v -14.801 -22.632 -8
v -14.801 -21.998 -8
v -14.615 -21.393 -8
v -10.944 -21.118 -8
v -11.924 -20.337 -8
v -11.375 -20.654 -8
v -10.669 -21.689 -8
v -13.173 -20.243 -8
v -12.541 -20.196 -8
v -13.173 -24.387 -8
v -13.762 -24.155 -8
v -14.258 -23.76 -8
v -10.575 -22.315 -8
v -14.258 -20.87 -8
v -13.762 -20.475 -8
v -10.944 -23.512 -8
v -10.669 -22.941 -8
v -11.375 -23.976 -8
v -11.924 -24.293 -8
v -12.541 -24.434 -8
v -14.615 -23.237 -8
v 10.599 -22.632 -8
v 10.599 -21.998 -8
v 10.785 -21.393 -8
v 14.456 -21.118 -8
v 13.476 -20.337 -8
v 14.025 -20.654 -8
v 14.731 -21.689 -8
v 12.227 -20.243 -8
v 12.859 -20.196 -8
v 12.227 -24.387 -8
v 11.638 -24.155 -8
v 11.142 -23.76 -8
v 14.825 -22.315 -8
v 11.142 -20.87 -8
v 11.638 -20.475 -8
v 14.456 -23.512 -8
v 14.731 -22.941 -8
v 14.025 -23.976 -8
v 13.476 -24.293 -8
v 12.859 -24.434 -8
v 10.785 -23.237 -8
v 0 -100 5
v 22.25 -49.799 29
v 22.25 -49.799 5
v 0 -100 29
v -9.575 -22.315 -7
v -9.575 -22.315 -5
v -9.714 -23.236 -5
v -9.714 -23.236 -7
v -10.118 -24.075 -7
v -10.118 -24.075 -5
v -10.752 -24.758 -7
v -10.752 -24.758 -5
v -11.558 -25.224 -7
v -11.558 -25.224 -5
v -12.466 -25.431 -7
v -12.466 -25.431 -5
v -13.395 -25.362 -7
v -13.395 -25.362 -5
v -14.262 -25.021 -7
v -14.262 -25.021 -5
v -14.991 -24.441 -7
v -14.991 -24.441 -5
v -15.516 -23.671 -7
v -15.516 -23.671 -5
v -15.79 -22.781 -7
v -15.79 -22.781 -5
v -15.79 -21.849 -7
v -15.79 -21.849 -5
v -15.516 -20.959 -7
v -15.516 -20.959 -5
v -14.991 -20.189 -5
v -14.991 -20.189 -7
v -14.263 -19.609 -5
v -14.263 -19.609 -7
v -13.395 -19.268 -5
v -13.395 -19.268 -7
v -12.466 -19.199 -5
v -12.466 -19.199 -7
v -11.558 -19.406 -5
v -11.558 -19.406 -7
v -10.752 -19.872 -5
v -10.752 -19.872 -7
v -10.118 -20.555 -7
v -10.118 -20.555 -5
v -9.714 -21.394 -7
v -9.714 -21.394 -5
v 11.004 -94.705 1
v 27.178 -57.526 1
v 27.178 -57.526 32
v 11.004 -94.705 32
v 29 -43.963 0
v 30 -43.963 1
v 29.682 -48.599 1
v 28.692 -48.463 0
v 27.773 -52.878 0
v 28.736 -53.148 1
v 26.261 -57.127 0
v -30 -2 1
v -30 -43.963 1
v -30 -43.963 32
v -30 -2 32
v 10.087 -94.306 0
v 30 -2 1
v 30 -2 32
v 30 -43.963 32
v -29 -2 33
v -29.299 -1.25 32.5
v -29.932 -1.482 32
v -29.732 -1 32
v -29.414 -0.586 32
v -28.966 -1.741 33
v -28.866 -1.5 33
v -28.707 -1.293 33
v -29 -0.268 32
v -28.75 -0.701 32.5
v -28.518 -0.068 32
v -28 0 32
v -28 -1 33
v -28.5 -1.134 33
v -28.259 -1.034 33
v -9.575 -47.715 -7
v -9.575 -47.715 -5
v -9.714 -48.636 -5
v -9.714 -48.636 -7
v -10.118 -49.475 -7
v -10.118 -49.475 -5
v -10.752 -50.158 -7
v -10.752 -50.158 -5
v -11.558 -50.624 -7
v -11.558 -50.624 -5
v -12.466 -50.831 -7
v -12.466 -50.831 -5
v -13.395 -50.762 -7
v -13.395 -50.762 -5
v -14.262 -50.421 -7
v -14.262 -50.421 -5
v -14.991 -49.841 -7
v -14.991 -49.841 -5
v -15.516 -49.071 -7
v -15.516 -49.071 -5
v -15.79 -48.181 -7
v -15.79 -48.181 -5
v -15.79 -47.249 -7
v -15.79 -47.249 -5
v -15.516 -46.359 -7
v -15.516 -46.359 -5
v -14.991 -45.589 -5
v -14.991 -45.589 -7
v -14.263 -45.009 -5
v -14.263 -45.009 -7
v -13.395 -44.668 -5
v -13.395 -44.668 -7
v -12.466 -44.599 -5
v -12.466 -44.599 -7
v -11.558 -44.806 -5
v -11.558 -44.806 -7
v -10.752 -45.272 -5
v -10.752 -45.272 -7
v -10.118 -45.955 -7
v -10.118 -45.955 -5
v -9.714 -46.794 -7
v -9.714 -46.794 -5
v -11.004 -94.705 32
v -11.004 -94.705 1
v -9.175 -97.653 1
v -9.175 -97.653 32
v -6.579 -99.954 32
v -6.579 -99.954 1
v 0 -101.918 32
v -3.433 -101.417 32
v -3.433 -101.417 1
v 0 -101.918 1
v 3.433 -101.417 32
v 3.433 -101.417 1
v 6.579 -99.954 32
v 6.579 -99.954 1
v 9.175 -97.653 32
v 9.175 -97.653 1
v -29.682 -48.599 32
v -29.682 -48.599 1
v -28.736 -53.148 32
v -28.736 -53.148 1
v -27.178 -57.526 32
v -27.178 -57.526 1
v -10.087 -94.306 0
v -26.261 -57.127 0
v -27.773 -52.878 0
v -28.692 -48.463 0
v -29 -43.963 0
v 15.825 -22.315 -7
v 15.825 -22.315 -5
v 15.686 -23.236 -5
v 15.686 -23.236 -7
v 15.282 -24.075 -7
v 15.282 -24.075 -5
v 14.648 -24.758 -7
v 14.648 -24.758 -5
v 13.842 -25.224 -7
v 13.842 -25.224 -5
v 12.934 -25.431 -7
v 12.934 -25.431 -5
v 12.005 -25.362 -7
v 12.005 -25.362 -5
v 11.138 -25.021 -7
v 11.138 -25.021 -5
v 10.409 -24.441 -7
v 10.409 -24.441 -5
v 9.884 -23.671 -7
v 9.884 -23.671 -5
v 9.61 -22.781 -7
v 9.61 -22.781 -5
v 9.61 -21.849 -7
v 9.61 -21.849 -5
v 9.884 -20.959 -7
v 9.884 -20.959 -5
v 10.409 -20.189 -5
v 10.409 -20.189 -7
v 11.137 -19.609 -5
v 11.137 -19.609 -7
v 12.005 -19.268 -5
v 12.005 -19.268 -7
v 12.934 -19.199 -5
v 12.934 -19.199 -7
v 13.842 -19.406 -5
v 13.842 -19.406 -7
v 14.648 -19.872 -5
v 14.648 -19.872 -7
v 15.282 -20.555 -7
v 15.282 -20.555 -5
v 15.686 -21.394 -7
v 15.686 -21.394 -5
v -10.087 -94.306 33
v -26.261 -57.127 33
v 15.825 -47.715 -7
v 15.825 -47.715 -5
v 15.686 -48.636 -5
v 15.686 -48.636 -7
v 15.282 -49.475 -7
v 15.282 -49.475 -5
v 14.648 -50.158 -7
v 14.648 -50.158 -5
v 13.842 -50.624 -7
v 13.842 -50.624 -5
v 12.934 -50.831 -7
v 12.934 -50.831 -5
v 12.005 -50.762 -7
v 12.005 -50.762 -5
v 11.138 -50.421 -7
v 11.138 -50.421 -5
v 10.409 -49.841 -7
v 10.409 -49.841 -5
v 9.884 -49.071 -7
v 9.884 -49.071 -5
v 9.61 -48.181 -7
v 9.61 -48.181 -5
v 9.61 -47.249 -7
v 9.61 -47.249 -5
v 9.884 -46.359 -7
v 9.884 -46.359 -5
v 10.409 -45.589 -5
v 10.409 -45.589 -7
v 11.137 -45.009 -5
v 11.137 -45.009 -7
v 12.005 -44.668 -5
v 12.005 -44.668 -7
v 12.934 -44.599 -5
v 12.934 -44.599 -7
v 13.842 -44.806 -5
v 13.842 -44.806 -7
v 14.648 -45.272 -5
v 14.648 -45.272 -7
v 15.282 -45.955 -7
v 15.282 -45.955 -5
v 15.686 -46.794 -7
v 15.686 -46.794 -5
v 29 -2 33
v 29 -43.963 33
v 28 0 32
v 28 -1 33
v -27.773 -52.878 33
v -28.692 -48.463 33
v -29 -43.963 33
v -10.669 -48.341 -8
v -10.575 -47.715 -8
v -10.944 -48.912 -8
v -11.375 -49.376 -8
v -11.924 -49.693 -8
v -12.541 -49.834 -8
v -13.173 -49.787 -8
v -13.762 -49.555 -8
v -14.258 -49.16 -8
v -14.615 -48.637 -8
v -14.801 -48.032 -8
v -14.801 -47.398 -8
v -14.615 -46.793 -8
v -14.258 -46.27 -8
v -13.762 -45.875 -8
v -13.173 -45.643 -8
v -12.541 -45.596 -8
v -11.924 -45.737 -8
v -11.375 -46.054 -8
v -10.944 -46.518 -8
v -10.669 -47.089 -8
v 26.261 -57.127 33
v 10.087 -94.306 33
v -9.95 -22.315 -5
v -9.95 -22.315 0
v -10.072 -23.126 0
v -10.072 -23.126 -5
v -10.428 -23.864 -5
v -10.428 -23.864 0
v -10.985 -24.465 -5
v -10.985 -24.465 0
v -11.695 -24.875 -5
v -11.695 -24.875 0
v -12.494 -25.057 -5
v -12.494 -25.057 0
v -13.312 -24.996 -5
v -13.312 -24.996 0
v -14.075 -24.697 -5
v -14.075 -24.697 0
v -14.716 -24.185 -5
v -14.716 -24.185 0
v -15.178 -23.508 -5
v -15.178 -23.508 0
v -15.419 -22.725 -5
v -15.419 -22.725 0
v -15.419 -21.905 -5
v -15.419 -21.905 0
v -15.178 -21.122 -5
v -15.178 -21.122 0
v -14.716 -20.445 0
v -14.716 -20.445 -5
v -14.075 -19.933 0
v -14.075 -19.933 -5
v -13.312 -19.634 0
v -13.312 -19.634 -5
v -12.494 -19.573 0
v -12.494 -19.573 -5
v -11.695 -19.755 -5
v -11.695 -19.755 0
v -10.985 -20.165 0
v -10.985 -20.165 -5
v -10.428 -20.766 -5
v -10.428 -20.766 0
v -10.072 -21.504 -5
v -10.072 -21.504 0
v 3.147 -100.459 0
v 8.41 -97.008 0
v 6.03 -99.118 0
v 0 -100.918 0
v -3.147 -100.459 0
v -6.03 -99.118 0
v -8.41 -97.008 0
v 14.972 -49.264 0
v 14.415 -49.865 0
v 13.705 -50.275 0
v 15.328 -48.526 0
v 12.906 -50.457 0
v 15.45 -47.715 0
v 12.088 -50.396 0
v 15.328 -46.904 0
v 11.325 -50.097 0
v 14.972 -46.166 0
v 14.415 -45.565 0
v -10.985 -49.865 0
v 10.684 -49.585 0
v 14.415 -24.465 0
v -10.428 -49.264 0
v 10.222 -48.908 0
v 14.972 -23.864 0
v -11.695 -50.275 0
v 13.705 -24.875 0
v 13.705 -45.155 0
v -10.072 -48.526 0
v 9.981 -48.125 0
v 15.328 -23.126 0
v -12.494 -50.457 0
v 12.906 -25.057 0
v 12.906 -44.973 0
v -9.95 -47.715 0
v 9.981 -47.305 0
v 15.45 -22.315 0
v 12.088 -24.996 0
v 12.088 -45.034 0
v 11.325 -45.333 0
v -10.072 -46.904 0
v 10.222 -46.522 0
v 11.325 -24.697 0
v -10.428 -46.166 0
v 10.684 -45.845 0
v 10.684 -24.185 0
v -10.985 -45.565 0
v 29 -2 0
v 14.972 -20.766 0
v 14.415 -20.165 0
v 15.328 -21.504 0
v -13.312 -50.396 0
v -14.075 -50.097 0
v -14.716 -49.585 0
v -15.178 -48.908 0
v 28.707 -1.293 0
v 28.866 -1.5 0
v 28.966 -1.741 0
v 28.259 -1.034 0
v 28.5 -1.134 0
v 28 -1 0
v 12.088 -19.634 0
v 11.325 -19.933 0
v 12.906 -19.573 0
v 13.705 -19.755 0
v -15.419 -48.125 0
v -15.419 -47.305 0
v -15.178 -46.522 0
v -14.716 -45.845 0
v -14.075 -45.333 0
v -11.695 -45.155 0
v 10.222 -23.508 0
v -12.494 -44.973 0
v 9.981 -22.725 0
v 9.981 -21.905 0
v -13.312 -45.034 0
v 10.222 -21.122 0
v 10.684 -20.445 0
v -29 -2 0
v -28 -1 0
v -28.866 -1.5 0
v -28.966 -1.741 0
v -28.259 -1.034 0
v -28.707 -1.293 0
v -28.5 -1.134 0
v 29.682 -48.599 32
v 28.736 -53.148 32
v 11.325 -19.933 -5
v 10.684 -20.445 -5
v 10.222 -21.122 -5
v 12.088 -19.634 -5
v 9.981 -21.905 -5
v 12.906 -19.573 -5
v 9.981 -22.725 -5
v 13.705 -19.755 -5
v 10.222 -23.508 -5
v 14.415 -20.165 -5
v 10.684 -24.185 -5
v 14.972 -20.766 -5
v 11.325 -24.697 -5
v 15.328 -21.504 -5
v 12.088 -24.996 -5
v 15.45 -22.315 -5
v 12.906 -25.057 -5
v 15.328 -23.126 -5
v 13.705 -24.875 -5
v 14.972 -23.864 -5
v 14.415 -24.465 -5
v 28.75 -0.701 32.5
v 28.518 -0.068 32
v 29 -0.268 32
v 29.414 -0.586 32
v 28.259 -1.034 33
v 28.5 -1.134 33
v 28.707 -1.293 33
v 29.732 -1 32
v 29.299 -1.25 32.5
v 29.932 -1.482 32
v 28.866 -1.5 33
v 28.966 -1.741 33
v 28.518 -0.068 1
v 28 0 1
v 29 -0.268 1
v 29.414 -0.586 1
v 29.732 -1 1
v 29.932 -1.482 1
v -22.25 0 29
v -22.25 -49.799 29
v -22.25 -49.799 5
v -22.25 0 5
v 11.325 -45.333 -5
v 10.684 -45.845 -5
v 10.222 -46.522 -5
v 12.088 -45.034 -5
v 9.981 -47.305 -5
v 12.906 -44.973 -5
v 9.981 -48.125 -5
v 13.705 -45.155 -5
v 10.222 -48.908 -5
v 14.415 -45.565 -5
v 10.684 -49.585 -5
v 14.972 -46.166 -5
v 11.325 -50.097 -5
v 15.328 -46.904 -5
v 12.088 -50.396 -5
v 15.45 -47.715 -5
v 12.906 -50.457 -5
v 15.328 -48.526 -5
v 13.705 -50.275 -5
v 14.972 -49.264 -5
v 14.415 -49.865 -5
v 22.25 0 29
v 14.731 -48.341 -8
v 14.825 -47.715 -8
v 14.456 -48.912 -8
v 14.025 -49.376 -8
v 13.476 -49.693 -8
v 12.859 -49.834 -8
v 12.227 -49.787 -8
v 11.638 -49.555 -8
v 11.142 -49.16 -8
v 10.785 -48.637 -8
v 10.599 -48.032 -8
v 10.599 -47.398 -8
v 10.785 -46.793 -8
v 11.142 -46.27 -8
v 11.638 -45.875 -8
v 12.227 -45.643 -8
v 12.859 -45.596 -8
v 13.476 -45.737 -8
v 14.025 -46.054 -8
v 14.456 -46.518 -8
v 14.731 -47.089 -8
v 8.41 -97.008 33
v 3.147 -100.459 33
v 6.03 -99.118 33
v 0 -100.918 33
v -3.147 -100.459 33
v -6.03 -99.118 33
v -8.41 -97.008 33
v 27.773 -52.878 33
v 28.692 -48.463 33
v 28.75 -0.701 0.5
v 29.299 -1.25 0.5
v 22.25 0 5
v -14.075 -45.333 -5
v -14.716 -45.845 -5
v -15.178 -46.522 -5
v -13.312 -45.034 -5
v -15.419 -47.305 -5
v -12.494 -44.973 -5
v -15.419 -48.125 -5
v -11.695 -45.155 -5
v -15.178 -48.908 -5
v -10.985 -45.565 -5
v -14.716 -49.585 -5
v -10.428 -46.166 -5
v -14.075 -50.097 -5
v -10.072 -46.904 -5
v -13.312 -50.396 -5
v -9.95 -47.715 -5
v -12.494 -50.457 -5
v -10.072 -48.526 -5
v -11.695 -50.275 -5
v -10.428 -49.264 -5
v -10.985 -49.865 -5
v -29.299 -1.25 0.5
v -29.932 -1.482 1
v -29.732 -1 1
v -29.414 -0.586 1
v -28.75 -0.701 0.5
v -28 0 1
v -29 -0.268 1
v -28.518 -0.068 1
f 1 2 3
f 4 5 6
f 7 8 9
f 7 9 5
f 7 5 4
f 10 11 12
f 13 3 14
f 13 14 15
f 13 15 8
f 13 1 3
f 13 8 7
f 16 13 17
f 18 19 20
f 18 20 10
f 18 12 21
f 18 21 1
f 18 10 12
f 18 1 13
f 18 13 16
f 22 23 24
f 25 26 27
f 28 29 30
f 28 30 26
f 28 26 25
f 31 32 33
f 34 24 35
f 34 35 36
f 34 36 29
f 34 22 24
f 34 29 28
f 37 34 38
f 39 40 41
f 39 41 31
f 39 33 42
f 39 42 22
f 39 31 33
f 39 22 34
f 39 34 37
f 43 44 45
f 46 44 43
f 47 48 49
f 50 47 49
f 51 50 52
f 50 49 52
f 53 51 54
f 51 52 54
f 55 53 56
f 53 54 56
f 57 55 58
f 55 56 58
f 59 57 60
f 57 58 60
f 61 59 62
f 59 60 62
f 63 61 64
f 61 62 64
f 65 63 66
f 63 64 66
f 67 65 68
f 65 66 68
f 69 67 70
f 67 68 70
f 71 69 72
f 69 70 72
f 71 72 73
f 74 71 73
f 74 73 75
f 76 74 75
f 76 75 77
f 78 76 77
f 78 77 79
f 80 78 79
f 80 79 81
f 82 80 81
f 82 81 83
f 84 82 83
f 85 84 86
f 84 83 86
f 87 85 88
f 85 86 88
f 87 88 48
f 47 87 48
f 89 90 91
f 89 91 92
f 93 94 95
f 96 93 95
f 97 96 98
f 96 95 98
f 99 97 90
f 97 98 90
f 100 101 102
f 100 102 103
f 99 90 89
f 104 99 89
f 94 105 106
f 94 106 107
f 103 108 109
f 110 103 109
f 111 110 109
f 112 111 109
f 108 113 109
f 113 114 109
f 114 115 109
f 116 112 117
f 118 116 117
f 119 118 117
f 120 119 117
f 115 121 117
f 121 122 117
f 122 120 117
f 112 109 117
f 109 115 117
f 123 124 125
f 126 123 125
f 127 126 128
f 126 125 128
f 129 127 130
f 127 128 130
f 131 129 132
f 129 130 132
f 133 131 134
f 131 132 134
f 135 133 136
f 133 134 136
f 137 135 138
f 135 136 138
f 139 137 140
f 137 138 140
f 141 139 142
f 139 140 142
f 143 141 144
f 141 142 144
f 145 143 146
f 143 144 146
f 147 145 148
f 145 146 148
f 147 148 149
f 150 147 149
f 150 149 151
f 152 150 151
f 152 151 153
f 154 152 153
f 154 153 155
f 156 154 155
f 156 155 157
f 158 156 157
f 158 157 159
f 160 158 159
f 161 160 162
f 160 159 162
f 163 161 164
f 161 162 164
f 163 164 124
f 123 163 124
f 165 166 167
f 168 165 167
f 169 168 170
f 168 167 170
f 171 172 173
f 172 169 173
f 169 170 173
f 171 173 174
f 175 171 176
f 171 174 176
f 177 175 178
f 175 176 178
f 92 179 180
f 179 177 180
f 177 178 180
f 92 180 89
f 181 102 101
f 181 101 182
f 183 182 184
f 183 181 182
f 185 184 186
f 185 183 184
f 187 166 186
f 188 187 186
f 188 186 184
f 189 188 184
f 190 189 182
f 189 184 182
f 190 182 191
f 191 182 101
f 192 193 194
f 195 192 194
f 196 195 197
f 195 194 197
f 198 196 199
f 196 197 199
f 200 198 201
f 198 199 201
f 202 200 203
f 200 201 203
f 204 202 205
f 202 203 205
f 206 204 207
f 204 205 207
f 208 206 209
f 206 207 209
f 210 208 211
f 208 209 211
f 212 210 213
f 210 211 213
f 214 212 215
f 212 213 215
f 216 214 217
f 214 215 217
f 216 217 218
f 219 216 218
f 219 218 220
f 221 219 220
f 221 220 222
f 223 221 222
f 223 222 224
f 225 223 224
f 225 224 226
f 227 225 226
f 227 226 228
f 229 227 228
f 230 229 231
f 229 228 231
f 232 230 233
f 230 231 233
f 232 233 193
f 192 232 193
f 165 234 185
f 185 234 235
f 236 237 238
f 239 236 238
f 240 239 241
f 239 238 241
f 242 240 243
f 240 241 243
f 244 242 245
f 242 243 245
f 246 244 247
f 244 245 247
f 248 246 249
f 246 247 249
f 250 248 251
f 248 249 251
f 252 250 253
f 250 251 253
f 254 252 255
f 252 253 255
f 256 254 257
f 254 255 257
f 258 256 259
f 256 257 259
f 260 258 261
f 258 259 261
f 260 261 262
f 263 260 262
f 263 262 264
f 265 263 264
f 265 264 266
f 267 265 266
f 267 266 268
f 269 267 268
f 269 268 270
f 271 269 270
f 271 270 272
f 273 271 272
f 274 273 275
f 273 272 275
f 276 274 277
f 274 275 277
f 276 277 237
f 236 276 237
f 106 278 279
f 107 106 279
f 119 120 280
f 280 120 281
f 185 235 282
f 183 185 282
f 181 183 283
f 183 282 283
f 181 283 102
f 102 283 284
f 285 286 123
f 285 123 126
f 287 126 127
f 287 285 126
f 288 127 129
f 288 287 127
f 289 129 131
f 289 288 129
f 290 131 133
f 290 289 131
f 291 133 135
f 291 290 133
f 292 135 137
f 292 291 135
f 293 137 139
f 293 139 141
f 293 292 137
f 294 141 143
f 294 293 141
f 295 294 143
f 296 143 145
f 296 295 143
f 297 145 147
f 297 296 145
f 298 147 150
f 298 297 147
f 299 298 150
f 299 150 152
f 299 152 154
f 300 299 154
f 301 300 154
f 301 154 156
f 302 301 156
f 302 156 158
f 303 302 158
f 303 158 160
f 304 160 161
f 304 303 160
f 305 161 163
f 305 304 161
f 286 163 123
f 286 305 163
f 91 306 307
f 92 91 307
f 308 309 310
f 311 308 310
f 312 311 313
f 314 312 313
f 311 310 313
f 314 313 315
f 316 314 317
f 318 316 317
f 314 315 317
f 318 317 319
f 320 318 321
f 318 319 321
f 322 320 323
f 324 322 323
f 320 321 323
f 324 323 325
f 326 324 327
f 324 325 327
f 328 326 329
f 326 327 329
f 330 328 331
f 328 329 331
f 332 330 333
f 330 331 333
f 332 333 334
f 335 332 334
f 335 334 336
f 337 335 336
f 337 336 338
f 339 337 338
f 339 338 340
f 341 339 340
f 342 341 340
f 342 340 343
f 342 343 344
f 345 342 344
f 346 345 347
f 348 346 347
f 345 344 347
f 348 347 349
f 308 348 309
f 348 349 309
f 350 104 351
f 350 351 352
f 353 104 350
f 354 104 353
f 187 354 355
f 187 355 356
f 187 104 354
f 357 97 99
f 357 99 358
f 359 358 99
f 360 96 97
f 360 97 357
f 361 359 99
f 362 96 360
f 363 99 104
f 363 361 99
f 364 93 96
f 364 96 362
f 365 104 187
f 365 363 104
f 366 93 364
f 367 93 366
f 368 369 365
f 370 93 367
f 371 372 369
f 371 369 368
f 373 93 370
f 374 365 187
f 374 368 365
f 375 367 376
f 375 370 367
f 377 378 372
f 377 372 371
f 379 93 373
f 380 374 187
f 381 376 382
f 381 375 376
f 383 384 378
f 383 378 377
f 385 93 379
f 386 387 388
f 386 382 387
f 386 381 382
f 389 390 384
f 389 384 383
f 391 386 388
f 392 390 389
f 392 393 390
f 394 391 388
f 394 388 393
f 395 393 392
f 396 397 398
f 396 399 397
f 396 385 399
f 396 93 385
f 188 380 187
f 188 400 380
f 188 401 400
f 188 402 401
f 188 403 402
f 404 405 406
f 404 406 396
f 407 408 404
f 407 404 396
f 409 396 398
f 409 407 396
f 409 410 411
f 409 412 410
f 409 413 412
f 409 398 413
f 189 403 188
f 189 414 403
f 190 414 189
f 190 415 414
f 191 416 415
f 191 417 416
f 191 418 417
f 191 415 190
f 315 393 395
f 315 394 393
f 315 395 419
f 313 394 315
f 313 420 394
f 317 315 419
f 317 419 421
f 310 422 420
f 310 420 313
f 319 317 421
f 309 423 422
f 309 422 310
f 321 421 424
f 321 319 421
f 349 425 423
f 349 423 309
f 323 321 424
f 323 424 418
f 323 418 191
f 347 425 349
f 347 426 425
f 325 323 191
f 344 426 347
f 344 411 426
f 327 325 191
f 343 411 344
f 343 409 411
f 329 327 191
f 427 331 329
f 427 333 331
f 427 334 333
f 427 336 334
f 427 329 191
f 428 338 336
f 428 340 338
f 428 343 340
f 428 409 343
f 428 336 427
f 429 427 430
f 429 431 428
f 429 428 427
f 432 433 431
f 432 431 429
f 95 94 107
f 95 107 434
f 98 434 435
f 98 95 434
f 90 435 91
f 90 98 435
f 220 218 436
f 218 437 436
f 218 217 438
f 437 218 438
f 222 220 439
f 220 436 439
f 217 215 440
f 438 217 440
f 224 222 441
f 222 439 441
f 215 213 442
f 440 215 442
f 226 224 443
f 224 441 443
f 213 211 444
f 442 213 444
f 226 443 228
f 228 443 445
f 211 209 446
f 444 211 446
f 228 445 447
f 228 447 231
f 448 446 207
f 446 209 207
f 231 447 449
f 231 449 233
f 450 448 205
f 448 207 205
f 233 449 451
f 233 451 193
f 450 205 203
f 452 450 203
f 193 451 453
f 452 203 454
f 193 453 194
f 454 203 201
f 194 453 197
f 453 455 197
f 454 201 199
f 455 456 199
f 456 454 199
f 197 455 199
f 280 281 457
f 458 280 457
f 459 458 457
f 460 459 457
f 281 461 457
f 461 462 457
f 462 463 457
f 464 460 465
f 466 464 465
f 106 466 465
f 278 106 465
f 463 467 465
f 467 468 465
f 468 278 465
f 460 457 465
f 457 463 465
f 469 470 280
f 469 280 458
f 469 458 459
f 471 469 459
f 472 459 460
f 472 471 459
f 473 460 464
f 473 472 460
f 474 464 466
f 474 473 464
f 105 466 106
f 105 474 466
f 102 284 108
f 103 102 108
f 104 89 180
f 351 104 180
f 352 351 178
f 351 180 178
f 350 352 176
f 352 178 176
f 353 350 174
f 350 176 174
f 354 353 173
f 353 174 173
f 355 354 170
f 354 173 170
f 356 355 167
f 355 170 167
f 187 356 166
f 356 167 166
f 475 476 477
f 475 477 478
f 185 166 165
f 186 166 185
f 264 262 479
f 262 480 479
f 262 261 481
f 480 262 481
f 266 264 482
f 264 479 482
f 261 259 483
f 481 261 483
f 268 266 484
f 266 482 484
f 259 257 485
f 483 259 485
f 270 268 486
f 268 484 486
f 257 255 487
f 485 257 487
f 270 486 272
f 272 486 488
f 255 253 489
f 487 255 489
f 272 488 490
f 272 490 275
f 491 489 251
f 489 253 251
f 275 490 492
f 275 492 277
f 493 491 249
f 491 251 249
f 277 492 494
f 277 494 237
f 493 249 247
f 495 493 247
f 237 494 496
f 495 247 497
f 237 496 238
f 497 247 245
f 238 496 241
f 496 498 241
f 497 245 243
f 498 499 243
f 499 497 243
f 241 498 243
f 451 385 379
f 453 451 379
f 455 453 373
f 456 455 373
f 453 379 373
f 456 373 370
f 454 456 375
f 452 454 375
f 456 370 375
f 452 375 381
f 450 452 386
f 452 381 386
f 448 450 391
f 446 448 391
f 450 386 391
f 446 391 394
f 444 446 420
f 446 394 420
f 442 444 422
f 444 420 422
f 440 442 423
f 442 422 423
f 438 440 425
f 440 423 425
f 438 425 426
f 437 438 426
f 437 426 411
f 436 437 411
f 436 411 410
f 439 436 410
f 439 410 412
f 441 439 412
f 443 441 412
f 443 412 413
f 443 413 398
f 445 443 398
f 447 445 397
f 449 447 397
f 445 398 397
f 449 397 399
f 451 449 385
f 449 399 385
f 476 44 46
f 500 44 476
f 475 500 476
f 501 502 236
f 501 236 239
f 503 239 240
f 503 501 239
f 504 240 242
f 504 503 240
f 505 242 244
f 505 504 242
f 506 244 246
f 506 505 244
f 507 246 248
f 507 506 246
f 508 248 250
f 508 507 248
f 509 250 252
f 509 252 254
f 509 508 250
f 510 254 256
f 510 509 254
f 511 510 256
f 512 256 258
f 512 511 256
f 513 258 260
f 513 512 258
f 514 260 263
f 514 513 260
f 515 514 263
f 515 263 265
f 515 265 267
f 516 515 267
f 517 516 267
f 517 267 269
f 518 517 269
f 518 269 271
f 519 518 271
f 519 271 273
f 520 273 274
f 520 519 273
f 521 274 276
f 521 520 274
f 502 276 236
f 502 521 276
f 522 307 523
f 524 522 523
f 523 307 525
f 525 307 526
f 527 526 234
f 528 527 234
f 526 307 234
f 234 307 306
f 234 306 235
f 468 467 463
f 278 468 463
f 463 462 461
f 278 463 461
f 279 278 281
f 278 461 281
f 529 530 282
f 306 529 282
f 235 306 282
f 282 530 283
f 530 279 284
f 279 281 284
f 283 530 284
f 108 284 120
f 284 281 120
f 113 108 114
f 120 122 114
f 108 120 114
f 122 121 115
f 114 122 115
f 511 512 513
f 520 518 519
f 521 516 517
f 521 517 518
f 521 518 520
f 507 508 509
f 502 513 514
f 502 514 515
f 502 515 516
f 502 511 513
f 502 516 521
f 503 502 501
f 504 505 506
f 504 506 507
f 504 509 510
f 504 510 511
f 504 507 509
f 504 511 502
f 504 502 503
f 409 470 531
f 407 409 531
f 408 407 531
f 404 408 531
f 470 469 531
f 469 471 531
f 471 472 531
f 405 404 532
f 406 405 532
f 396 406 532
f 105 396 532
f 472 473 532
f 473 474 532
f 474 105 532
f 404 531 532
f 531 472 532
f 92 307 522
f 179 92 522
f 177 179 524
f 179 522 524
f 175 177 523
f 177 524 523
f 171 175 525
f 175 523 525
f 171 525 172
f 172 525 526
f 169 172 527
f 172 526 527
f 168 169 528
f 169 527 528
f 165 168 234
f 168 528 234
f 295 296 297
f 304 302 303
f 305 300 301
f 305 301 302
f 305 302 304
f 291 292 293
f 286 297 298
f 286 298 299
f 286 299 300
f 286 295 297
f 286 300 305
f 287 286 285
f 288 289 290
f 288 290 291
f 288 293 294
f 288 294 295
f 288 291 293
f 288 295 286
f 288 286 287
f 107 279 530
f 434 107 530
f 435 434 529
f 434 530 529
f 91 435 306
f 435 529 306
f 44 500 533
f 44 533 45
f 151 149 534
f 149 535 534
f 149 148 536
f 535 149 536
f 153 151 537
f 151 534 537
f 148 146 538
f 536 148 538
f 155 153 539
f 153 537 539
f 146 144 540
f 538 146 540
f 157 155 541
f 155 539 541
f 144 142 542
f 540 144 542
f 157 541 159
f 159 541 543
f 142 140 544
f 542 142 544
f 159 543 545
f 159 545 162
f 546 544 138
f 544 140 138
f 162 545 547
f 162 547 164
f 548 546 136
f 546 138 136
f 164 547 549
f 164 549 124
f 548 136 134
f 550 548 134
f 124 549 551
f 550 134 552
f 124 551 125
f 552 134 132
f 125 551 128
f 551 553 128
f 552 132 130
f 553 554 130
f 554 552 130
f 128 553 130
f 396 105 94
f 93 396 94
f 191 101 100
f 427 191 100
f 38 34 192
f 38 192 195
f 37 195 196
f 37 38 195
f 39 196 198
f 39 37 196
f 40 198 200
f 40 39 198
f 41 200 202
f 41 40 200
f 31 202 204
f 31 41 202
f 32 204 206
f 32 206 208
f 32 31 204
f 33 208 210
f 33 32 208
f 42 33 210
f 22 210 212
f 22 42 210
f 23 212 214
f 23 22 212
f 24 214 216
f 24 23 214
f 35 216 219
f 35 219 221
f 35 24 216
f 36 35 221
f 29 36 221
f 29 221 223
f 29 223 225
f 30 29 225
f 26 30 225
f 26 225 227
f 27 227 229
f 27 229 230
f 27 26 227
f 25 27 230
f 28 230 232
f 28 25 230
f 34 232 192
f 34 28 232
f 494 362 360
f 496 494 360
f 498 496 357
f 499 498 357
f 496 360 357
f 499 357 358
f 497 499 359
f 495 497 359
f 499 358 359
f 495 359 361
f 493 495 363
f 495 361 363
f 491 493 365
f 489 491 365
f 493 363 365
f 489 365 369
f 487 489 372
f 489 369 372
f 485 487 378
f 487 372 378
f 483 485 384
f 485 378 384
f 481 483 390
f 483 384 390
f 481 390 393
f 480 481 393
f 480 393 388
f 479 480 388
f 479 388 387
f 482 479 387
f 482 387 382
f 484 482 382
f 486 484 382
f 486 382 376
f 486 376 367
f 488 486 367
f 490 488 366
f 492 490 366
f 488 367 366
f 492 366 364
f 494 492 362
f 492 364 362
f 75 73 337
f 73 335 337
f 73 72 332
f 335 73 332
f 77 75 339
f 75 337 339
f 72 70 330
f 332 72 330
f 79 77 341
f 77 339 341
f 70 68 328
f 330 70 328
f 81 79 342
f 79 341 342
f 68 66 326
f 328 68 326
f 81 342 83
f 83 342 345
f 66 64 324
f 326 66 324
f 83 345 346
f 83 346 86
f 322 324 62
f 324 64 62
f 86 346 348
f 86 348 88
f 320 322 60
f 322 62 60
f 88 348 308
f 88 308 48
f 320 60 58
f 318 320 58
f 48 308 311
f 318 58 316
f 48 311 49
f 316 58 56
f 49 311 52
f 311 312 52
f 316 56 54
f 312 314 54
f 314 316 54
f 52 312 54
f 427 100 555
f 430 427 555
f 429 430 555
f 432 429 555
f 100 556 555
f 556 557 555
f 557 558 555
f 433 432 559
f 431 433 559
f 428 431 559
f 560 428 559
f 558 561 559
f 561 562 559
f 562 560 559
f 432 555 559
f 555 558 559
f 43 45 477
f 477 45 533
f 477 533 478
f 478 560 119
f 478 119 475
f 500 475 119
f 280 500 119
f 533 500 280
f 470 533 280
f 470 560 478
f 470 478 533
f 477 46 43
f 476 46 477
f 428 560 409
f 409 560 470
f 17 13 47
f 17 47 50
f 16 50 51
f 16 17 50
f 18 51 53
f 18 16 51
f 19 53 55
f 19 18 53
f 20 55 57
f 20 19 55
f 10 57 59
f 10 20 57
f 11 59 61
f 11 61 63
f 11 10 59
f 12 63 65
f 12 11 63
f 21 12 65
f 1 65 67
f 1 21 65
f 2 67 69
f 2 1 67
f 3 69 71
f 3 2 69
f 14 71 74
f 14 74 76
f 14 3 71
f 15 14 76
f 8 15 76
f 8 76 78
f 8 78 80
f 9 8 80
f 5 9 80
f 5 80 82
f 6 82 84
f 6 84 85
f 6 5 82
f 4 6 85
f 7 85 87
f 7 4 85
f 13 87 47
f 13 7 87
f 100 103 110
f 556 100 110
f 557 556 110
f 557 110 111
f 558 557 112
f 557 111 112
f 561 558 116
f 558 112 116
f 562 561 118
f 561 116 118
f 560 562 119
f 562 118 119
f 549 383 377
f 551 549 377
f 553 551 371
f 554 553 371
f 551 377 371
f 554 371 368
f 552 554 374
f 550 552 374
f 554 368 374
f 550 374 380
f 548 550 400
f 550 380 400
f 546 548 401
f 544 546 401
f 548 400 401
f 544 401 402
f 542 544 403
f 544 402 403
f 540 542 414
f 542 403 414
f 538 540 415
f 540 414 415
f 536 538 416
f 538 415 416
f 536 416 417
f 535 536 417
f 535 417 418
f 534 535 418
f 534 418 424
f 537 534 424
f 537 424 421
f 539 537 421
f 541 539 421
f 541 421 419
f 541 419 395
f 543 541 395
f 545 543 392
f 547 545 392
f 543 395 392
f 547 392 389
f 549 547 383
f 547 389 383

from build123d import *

# Parameters (mm, degrees)
PAD_DEPTH       = 33
POCKET_DEPTH    = 28
PAD001_DEPTH    = 4
SKETCH003_R     = 2.75
PAD002_DEPTH    = 5
SKETCH004_R     = 3.125
PAD003_DEPTH    = 3
FILLET_R        = 34
FILLET001_R     = 12
FILLET002_R     = 2
CHAMFER_SIZE    = 1
CHAMFER001_SIZE = 1
CHAMFER002_SIZE = 1


with BuildPart() as part:
    # Sketch → Pad (new body)
    with BuildSketch(Plane.XY):
        Polygon((-30, 0), (30, 0), (30, -51.038384), (0, -120), (-30, -51.038384), align=None)
    extrude(amount=PAD_DEPTH)

    # Sketch001 (on Face7 of Pad) → Pocket (cut)
    with BuildSketch(Plane.XY.offset(33)):
        Polygon((-22.25, 3.29609), (22.25, 3.29609), (22.25, -49.798735), (0, -100), (-22.25, -49.798735), align=None)
    extrude(amount=-POCKET_DEPTH, mode=Mode.SUBTRACT)

    # Sketch002 (on Face4 of Pocket) → Pad001 (join)
    with BuildSketch(Plane.XY.offset(33)):
        Polygon((-30, 0), (30, 0), (30, -51.038384), (0, -120), (-30, -51.038384), align=None)
    extrude(amount=-PAD001_DEPTH)

    # Sketch003 (on Face2 of Pad001) → Pad002 (join)
    with BuildSketch(Plane(origin=(0, 0, 0), x_dir=(1, 0, 0), z_dir=(0, 0, -1))):
        with Locations((-12.7, 22.314992)):
            Circle(SKETCH003_R)
        with Locations((12.7, 22.314992)):
            Circle(SKETCH003_R)
        with Locations((-12.7, 47.714992)):
            Circle(SKETCH003_R)
        with Locations((12.7, 47.714992)):
            Circle(SKETCH003_R)
    extrude(amount=PAD002_DEPTH)

    # Sketch004 (on Face25 of Pad002) → Pad003 (join)
    with BuildSketch(Plane(origin=(0, 0, -5), x_dir=(1, 0, 0), z_dir=(0, 0, -1))):
        with Locations((12.7, 47.714992)):
            Circle(SKETCH004_R)
        with Locations((-12.7, 47.714992)):
            Circle(SKETCH004_R)
        with Locations((-12.7, 22.314992)):
            Circle(SKETCH004_R)
        with Locations((12.7, 22.314992)):
            Circle(SKETCH004_R)
    extrude(amount=PAD003_DEPTH)

    # Fillet
    fillet_edges = [part.edges().sort_by_distance(p)[0] for p in [
        (30, -51.038384, 14.5),
        (-30, -51.038384, 14.5),
    ]]
    fillet(fillet_edges, radius=FILLET_R)

    # Fillet001
    fillet001_edges = [part.edges().sort_by_distance(p)[0] for p in [
        (0, -120, 14.5),
    ]]
    fillet(fillet001_edges, radius=FILLET001_R)

    # Fillet002
    fillet002_edges = [part.edges().sort_by_distance(p)[0] for p in [
        (-30, 0, 14.5),
        (30, 0, 14.5),
    ]]
    fillet(fillet002_edges, radius=FILLET002_R)

    # Chamfer
    chamfer_edges = [part.edges().sort_by_distance(p)[0] for p in [
        (30, -22.981604, 33),
    ]]
    chamfer(chamfer_edges, length=CHAMFER_SIZE)

    # Chamfer001
    chamfer001_edges = [part.edges().sort_by_distance(p)[0] for p in [
        (0, 0, 0),
    ]]
    chamfer(chamfer001_edges, length=CHAMFER001_SIZE)

    # Chamfer002
    chamfer002_edges = [part.edges().sort_by_distance(p)[0] for p in [
        (-15.825, -22.314992, -8),
        (9.575, -22.314992, -8),
        (9.575, -47.714992, -8),
        (-15.825, -47.714992, -8),
    ]]
    chamfer(chamfer002_edges, length=CHAMFER002_SIZE)


solid = part.part
